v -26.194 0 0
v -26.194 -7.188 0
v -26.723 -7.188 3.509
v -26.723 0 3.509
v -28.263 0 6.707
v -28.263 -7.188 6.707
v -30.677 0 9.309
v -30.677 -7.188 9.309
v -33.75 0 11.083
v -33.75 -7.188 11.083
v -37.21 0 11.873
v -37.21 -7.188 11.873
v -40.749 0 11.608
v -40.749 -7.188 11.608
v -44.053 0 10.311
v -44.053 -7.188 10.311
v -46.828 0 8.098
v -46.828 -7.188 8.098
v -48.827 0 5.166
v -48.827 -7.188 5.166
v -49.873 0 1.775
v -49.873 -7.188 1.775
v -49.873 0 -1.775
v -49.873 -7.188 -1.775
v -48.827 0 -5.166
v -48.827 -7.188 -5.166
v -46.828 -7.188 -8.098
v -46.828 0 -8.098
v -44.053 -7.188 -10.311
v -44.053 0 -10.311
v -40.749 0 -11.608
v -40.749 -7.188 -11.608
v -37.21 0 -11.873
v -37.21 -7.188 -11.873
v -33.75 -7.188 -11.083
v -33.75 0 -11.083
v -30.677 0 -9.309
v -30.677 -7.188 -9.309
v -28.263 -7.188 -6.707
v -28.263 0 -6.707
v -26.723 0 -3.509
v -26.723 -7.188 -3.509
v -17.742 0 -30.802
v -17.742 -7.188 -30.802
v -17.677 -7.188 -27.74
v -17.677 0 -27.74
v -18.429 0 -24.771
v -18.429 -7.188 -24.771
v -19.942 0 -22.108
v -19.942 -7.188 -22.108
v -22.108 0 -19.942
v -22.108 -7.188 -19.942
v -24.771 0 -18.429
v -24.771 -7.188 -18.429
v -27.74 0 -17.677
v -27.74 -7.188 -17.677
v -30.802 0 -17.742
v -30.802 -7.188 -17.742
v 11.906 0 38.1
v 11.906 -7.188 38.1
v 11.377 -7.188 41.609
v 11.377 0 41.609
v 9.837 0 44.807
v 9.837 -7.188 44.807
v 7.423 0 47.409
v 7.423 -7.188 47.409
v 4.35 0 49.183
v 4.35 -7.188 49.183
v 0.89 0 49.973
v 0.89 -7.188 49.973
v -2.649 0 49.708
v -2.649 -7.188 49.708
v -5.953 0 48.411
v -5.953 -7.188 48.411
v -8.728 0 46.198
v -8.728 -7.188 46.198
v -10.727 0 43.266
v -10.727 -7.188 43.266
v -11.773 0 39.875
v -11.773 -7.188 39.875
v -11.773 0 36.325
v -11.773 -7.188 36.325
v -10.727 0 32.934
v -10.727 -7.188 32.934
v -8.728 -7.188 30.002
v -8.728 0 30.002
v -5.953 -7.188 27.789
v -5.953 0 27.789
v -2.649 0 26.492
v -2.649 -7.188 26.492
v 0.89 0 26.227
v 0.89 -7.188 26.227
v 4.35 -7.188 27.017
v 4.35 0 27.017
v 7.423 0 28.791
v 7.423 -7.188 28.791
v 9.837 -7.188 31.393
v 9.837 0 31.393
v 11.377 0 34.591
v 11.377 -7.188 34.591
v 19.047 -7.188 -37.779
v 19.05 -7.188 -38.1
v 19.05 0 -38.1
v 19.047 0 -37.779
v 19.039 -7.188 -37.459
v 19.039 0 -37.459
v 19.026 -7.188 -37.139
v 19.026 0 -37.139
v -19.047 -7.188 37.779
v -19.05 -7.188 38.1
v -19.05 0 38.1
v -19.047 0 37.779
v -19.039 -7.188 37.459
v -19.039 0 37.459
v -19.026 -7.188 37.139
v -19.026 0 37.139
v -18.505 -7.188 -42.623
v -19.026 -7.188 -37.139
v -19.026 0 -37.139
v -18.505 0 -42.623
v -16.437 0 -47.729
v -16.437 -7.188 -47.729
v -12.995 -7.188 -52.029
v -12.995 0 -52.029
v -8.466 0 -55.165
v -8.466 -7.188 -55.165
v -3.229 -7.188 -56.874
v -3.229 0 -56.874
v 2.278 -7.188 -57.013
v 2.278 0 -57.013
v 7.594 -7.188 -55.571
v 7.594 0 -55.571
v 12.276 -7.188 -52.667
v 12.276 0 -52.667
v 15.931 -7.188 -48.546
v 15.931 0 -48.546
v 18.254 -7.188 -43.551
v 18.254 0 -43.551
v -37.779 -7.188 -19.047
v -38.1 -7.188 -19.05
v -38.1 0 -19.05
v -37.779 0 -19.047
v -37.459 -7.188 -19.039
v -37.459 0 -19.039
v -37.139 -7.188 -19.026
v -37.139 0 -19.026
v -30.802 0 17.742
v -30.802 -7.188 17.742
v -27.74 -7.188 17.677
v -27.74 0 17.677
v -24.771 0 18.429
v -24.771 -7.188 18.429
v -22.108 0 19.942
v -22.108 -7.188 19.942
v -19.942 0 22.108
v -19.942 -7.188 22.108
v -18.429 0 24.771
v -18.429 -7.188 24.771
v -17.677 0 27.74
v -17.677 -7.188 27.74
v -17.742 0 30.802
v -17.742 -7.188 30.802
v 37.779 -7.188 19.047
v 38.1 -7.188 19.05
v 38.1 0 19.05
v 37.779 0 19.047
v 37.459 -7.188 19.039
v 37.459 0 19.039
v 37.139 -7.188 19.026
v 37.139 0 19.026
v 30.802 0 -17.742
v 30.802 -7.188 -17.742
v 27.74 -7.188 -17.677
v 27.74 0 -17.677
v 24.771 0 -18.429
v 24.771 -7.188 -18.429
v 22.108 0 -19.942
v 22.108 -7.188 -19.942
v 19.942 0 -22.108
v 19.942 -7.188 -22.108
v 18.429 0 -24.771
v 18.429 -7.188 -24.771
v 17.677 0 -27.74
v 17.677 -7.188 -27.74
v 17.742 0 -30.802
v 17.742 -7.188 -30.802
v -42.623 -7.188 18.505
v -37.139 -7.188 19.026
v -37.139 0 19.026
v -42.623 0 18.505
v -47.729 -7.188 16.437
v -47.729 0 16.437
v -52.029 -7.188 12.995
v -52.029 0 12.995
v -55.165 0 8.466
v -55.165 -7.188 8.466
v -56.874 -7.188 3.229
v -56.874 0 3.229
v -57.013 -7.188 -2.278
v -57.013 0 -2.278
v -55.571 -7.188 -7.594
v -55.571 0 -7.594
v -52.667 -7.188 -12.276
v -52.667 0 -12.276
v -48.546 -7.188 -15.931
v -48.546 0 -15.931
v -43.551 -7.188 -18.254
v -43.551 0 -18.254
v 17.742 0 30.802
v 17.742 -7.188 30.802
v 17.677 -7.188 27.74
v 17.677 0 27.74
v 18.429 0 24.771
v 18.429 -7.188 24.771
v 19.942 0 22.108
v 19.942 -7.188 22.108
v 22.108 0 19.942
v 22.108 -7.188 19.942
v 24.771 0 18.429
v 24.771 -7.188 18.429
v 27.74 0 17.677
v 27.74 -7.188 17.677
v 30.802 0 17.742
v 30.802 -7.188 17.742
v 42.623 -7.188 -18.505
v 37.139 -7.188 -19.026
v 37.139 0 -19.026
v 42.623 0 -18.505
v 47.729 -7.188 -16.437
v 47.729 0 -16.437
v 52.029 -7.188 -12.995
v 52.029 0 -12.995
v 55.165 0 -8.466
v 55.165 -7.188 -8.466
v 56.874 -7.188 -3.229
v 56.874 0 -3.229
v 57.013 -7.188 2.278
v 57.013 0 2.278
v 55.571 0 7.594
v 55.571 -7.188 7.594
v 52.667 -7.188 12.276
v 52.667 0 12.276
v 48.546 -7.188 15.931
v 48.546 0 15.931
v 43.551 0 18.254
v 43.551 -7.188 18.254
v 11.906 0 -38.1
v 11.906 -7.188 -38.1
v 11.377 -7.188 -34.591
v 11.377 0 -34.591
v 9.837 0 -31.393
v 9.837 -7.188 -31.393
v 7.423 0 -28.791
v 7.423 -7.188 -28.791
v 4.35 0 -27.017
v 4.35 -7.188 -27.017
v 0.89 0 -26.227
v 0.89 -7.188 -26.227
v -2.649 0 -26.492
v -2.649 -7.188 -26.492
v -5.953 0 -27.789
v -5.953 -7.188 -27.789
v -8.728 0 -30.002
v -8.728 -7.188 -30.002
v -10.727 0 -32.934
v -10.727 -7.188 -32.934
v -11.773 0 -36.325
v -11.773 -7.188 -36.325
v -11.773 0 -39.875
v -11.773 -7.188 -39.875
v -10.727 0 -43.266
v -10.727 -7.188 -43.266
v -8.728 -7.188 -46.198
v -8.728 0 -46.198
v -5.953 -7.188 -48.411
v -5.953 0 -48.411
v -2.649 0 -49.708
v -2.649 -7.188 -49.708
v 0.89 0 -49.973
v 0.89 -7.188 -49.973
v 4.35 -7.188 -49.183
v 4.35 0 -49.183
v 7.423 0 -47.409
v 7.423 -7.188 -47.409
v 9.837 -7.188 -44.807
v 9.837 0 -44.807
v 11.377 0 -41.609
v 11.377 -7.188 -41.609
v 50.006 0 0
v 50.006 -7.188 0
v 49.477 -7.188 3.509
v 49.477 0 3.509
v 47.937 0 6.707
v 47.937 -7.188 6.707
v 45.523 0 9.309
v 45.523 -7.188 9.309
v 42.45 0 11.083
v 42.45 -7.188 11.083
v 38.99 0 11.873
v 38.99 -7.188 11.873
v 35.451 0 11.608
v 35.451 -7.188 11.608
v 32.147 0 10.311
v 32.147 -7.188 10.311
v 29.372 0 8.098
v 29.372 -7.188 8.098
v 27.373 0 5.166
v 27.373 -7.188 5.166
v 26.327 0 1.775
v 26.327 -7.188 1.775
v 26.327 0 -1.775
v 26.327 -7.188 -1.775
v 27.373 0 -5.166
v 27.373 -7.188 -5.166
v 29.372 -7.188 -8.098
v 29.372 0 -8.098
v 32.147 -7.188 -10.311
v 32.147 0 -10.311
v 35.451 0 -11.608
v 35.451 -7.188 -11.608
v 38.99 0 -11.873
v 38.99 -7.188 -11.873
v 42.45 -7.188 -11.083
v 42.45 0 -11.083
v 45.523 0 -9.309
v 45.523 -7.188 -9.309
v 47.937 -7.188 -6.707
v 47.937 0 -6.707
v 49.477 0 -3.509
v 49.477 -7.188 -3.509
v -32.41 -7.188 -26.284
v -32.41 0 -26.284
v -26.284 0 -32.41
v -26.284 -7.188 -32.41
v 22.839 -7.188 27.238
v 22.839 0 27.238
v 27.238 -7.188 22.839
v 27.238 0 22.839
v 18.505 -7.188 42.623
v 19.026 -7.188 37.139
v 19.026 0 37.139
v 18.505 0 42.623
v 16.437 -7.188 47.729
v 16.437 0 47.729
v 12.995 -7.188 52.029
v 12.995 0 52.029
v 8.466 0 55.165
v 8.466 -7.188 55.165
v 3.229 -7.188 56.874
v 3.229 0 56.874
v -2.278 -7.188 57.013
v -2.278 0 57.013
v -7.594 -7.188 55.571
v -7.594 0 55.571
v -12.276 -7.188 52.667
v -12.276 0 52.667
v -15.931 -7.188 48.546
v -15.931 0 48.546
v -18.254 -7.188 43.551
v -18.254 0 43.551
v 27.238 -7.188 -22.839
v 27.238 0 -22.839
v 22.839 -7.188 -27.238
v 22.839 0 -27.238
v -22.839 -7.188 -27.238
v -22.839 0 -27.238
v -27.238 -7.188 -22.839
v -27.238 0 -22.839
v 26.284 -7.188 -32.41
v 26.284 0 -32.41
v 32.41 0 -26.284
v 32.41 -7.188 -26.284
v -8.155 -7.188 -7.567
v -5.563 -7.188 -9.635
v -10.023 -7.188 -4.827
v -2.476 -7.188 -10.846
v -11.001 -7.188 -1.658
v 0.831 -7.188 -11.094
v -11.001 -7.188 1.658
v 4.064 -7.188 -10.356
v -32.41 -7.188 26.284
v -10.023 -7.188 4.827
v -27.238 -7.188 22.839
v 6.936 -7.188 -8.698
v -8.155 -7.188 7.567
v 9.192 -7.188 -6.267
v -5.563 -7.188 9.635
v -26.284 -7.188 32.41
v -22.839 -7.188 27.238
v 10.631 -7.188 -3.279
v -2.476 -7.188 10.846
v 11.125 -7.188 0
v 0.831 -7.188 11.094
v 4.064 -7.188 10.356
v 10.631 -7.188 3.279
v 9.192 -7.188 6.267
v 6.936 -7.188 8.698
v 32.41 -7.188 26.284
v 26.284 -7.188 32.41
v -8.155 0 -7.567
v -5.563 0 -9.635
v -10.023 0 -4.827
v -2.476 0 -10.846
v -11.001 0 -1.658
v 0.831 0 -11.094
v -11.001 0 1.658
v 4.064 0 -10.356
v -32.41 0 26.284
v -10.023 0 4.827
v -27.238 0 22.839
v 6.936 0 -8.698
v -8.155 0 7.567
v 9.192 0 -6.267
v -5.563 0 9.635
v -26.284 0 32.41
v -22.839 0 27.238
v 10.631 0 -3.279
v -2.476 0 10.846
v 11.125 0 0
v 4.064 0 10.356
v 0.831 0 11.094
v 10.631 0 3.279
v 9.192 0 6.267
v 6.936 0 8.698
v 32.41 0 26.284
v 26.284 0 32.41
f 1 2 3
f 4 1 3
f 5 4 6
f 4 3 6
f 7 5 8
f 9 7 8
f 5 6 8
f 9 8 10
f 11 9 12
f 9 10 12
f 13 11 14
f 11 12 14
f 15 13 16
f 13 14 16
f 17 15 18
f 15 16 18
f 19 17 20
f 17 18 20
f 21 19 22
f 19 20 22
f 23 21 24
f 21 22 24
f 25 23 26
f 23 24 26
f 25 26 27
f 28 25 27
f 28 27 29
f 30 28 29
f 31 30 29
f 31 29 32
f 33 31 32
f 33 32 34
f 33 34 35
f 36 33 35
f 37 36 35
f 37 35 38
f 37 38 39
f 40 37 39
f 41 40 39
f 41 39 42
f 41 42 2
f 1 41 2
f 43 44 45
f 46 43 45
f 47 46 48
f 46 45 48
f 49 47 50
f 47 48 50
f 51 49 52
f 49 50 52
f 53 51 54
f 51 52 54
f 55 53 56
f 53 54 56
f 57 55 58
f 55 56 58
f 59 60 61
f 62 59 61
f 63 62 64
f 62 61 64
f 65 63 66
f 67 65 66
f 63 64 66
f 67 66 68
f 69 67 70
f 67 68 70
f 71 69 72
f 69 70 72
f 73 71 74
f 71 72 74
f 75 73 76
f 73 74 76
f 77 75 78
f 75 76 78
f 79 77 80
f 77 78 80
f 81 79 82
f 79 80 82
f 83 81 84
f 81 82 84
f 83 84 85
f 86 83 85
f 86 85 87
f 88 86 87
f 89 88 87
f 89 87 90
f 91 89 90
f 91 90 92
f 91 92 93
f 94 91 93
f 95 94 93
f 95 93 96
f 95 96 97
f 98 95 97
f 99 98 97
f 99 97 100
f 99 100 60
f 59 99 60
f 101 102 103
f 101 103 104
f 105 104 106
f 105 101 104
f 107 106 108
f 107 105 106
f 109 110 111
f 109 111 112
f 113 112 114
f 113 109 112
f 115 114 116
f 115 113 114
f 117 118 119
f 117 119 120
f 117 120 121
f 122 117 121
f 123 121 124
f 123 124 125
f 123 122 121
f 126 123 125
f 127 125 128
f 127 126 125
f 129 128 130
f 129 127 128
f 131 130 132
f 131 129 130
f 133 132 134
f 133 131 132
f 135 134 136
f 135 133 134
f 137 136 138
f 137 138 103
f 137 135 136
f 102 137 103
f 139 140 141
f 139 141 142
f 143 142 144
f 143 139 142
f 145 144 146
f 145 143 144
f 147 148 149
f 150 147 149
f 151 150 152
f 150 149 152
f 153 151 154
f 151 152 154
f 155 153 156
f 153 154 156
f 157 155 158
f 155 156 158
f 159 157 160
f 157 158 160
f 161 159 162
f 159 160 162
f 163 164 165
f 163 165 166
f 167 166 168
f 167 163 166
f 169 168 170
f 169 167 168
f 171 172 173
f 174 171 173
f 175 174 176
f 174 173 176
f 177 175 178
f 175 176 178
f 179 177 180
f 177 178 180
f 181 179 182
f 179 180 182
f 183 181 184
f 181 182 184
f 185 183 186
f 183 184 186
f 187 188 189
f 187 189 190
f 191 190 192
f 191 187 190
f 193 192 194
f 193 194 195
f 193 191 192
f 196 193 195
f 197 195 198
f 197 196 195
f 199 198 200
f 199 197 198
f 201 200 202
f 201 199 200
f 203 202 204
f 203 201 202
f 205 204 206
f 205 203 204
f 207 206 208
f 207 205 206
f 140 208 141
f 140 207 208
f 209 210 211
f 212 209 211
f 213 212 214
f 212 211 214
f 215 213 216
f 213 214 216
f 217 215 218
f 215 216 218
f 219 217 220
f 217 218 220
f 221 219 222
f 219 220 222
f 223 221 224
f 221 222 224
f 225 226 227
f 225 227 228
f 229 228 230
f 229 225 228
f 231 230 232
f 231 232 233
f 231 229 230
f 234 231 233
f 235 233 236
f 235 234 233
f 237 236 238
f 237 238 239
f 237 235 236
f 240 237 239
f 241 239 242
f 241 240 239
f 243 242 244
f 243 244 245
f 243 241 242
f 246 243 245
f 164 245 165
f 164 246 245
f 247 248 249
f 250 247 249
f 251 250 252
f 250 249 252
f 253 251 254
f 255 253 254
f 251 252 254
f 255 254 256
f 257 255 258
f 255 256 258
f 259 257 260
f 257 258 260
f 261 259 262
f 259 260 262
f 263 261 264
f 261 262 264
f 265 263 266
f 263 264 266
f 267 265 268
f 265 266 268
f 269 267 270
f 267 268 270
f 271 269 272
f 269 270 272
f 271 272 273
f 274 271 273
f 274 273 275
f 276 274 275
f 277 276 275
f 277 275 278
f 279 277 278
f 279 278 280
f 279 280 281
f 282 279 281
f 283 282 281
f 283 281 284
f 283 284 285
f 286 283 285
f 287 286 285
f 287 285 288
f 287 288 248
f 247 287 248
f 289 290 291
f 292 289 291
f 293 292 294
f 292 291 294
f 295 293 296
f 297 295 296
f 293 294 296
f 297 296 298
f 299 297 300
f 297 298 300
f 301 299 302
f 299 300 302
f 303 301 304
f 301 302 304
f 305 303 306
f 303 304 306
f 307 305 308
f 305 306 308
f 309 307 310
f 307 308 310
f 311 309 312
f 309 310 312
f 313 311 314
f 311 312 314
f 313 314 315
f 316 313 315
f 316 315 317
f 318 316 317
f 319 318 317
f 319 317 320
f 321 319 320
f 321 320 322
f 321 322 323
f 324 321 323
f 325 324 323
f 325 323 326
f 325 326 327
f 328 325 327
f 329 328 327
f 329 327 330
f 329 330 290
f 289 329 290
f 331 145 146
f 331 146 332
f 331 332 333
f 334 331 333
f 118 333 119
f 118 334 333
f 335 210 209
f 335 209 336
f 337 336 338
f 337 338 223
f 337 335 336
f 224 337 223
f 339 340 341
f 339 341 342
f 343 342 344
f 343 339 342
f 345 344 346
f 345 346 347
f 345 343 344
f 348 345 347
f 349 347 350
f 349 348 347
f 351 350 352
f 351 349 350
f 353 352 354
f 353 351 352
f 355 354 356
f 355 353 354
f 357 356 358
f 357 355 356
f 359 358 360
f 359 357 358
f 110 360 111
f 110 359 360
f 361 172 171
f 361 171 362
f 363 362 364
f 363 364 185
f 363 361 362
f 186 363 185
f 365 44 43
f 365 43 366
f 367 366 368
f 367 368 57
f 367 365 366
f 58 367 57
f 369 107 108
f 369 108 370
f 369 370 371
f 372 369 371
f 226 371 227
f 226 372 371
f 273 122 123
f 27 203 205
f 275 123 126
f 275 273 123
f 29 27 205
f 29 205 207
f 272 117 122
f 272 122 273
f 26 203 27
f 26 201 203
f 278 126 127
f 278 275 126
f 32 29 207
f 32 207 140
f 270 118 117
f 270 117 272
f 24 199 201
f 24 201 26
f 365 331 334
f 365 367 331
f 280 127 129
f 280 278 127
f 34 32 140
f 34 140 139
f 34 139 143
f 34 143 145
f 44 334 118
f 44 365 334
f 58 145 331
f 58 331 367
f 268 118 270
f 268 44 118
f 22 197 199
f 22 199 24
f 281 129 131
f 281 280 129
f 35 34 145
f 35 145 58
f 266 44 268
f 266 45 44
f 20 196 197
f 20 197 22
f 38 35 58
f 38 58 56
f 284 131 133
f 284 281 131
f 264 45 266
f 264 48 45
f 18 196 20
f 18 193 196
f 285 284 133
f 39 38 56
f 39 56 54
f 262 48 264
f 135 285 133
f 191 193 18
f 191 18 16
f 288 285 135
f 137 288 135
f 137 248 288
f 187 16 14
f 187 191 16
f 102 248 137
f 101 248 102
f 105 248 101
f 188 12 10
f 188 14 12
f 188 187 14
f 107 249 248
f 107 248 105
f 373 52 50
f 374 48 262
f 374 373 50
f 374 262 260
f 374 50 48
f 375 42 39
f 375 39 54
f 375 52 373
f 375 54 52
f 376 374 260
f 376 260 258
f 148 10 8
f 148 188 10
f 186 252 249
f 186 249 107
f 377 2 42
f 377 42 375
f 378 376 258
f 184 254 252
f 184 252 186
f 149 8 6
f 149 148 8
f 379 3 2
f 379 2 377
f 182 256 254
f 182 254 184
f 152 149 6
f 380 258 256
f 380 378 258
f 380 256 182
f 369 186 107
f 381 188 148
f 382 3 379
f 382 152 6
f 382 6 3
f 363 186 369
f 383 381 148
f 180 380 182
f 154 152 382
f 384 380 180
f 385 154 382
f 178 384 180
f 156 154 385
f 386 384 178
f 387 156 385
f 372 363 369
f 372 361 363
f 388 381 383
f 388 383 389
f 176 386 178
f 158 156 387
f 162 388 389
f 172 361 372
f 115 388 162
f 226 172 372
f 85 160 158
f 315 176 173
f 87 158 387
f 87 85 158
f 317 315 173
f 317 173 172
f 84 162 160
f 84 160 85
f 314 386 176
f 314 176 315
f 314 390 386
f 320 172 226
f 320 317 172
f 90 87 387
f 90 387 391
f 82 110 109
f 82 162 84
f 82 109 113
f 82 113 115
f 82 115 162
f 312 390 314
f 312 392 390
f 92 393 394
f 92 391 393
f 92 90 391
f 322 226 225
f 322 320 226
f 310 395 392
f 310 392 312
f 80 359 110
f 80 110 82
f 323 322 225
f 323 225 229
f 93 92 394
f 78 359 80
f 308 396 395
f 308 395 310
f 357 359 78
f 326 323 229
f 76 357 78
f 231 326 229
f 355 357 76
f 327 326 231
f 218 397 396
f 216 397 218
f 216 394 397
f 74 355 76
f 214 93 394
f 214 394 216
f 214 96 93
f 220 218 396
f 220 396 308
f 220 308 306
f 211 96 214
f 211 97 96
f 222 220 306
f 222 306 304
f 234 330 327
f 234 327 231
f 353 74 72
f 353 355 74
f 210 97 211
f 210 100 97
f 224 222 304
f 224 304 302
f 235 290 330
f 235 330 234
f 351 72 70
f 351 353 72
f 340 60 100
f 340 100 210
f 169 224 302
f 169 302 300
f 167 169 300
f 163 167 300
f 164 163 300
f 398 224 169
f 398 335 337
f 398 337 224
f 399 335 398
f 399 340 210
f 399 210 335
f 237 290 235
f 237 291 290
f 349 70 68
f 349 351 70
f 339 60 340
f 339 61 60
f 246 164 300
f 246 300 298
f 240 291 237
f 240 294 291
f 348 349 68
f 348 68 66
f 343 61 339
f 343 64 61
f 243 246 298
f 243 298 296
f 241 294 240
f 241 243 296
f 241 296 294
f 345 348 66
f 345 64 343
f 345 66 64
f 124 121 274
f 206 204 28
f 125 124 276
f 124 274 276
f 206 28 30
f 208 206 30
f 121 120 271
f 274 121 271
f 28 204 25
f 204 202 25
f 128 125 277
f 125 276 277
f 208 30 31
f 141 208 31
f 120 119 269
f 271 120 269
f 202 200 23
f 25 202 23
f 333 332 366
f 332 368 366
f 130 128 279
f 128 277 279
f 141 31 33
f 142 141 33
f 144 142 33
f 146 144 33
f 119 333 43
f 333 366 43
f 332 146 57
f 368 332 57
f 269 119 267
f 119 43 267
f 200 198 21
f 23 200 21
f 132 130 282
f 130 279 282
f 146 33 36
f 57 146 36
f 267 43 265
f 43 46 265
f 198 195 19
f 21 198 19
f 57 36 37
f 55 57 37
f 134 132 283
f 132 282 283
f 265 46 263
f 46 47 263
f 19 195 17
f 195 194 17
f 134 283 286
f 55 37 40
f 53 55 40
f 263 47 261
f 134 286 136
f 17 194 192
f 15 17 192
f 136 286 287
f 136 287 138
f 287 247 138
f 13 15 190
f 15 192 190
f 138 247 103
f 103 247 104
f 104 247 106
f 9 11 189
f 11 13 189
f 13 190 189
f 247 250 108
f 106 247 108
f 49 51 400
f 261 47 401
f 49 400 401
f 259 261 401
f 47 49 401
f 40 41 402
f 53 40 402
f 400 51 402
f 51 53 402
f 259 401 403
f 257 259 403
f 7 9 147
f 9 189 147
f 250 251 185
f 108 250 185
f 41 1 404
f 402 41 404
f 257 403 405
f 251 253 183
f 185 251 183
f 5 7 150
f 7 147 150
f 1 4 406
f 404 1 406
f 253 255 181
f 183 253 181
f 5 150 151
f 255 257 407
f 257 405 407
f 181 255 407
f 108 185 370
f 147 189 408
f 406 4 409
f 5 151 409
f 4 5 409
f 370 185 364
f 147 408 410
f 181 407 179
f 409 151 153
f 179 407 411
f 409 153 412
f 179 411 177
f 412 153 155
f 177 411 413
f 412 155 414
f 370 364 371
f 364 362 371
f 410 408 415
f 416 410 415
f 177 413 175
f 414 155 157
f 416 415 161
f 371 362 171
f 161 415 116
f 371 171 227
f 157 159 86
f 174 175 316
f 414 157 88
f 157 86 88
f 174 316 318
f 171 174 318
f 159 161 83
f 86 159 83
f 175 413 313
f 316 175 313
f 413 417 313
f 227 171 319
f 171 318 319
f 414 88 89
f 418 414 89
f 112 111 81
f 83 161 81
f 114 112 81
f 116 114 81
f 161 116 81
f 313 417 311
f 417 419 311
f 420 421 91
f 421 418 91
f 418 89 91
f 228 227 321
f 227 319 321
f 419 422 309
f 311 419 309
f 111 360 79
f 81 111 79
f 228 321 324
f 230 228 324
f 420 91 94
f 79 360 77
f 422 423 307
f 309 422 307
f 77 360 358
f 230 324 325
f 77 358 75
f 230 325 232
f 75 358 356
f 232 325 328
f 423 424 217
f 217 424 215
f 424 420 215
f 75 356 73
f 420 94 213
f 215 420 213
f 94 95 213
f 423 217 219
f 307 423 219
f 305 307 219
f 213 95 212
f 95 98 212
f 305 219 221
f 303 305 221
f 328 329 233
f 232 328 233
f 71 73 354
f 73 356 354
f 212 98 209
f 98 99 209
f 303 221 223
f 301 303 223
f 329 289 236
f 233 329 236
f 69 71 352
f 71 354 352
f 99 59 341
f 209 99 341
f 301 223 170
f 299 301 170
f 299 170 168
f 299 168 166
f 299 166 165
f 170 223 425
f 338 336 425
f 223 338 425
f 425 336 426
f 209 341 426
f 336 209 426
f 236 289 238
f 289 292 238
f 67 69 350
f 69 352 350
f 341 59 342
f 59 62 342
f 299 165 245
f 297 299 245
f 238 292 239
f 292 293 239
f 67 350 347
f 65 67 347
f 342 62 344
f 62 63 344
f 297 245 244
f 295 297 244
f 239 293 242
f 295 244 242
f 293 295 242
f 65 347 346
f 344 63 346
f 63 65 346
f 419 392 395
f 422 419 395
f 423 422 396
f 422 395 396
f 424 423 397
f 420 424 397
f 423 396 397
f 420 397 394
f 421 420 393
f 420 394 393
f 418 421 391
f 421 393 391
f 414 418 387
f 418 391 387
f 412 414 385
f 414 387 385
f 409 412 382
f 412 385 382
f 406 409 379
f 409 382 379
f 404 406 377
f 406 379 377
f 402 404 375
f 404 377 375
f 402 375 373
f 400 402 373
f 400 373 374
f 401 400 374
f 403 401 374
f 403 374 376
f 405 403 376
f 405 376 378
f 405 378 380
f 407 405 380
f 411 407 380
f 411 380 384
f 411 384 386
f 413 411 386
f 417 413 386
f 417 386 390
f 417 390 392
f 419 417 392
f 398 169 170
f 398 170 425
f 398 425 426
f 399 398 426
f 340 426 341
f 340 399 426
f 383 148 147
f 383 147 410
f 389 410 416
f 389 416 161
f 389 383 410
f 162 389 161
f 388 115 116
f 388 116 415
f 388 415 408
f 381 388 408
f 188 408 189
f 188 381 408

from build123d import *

# Parameters (mm, degrees)
F0_R            = 38.1
F1_DEPTH        = 7.1882
F2_R            = 11.1252
F3_DEPTH        = 7.62
F5_DEPTH        = 7.1882
F5_COPIES_COUNT = 4
F7_DEPTH        = 25.4
F9_DEPTH        = 7.1882
F10_R           = 11.90625
F11_DEPTH       = 25.4


# Not quite as in the source:
# - a pattern or mirror of a feature is missing from the dataset's text; its kind, count and spacing are read off the source's solid


with BuildPart() as f1:
    # F0 (on Front) → F1 (new body)
    with BuildSketch(Plane.XZ):
        Circle(F0_R)
    extrude(amount=F1_DEPTH)

    # F2 (on face) → F3 (cut)
    with BuildSketch(Plane.XZ.offset(7.1882)):
        Circle(F2_R)
    extrude(amount=-F3_DEPTH, mode=Mode.SUBTRACT)

    # F4 (on face) → F5 (join)
    with BuildSketch(Plane.XZ.offset(7.1882)):
        with BuildLine():
            ThreePointArc((-18.4450831863, 33.3375), (0, 19.05), (18.4450831863, 33.3375))
            ThreePointArc((18.4450831863, 33.3375), (0, 38.1), (-18.4450831863, 33.3375))
        make_face()
        with BuildLine():
            ThreePointArc((-19.05, 0), (-23.0396526434, 11.6656949), (-33.3375, 18.4450831863))
            ThreePointArc((-33.3375, 18.4450831863), (-38.1, 0), (-33.3375, -18.4450831863))
            ThreePointArc((-33.3375, -18.4450831863), (-23.0396526434, -11.6656949), (-19.05, 0))
        make_face()
        with BuildLine():
            ThreePointArc((19.05, -38.1), (18.8981657139, -35.6996182282), (18.4450831863, -33.3375))
            ThreePointArc((18.4450831863, -33.3375), (0, -38.1), (-18.4450831863, -33.3375))
            ThreePointArc((-18.4450831863, -33.3375), (-2.4003817718, -56.9981657139), (19.05, -38.1))
        make_face()
        with BuildLine():
            ThreePointArc((38.1, 0), (36.8901663726, 9.525), (33.3375, 18.4450831863))
            ThreePointArc((33.3375, 18.4450831863), (19.05, 0), (33.3375, -18.4450831863))
            ThreePointArc((33.3375, -18.4450831863), (36.8901663726, -9.525), (38.1, 0))
        make_face()
    f5 = extrude(amount=-F5_DEPTH)

    # F5_copies: F5 ×4 about axis
    f5_copies_axis = Axis((0, 0, 0), (0, 1, 0))
    for i in range(1, F5_COPIES_COUNT):
        add(f5.rotate(f5_copies_axis, i * 360 / F5_COPIES_COUNT))

    # F6 (on face) → F7 (cut)
    with BuildSketch(Plane.XZ.offset(7.1882)):
        with BuildLine():
            ThreePointArc((-33.3375, 18.4450831863), (-20.9517399354, 20.9517399354), (-18.4450831863, 33.3375))
            ThreePointArc((-18.4450831863, 33.3375), (-26.9407683632, 26.9407683632), (-33.3375, 18.4450831863))
        make_face()
        with BuildLine():
            ThreePointArc((-18.4450831863, -33.3375), (-20.9517399354, -20.9517399354), (-33.3375, -18.4450831863))
            ThreePointArc((-33.3375, -18.4450831863), (-26.9407683632, -26.9407683632), (-18.4450831863, -33.3375))
        make_face()
        with BuildLine():
            ThreePointArc((18.4450831863, -33.3375), (26.9407683632, -26.9407683632), (33.3375, -18.4450831863))
            ThreePointArc((33.3375, -18.4450831863), (20.9517399354, -20.9517399354), (18.4450831863, -33.3375))
        make_face()
        with BuildLine():
            ThreePointArc((33.3375, 18.4450831863), (26.9407683632, 26.9407683632), (18.4450831863, 33.3375))
            ThreePointArc((18.4450831863, 33.3375), (20.9517399354, 20.9517399354), (33.3375, 18.4450831863))
        make_face()
    extrude(amount=-F7_DEPTH, mode=Mode.SUBTRACT)

    # F8 (on face) → F9 (join)
    with BuildSketch(Plane.XZ.offset(7.1882)):
        with BuildLine():
            ThreePointArc((-37.1387970886, -19.0257349126), (-29.5065148582, -29.5065148582), (-19.0257349126, -37.1387970886))
            ThreePointArc((-19.0257349126, -37.1387970886), (-18.831569694, -35.2234599149), (-18.4450831863, -33.3375))
            ThreePointArc((-18.4450831863, -33.3375), (-18.0201411063, -32.0901876015), (-17.7415806811, -30.8022558951))
            ThreePointArc((-17.7415806811, -30.8022558951), (-25.1350616996, -25.1350616996), (-30.8022558951, -17.7415806811))
            ThreePointArc((-30.8022558951, -17.7415806811), (-32.0901876015, -18.0201411063), (-33.3375, -18.4450831863))
            ThreePointArc((-33.3375, -18.4450831863), (-35.2234599149, -18.831569694), (-37.1387970886, -19.0257349126))
        make_face()
        with BuildLine():
            ThreePointArc((19.0257349126, -37.1387970886), (29.5065148582, -29.5065148582), (37.1387970886, -19.0257349126))
            ThreePointArc((37.1387970886, -19.0257349126), (35.2234599149, -18.831569694), (33.3375, -18.4450831863))
            ThreePointArc((33.3375, -18.4450831863), (32.0901876015, -18.0201411063), (30.8022558951, -17.7415806811))
            ThreePointArc((30.8022558951, -17.7415806811), (25.1350616996, -25.1350616996), (17.7415806811, -30.8022558951))
            ThreePointArc((17.7415806811, -30.8022558951), (18.0201411063, -32.0901876015), (18.4450831863, -33.3375))
            ThreePointArc((18.4450831863, -33.3375), (18.831569694, -35.2234599149), (19.0257349126, -37.1387970886))
        make_face()
        with BuildLine():
            ThreePointArc((33.3375, 18.4450831863), (35.2234599149, 18.831569694), (37.1387970886, 19.0257349126))
            ThreePointArc((37.1387970886, 19.0257349126), (29.5065148582, 29.5065148582), (19.0257349126, 37.1387970886))
            ThreePointArc((19.0257349126, 37.1387970886), (18.831569694, 35.2234599149), (18.4450831863, 33.3375))
            ThreePointArc((18.4450831863, 33.3375), (18.0201411063, 32.0901876015), (17.7415806811, 30.8022558951))
            ThreePointArc((17.7415806811, 30.8022558951), (25.1350616996, 25.1350616996), (30.8022558951, 17.7415806811))
            ThreePointArc((30.8022558951, 17.7415806811), (32.0901876015, 18.0201411063), (33.3375, 18.4450831863))
        make_face()
        with BuildLine():
            ThreePointArc((-18.4450831863, 33.3375), (-18.831569694, 35.2234599149), (-19.0257349126, 37.1387970886))
            ThreePointArc((-19.0257349126, 37.1387970886), (-29.5065148582, 29.5065148582), (-37.1387970886, 19.0257349126))
            ThreePointArc((-37.1387970886, 19.0257349126), (-35.2234599149, 18.831569694), (-33.3375, 18.4450831863))
            ThreePointArc((-33.3375, 18.4450831863), (-32.0901876015, 18.0201411063), (-30.8022558951, 17.7415806811))
            ThreePointArc((-30.8022558951, 17.7415806811), (-25.1350616996, 25.1350616996), (-17.7415806811, 30.8022558951))
            ThreePointArc((-17.7415806811, 30.8022558951), (-18.0201411063, 32.0901876015), (-18.4450831863, 33.3375))
        make_face()
    extrude(amount=-F9_DEPTH)

    # F10 (on face) → F11 (cut)
    with BuildSketch(Plane.XZ.offset(7.1882)):
        with Locations((-38.1, 0)):
            Circle(F10_R)
        with Locations((0, 38.1)):
            Circle(F10_R)
        with Locations((38.1, 0)):
            Circle(F10_R)
        with Locations((0, -38.1)):
            Circle(F10_R)
    extrude(amount=-F11_DEPTH, mode=Mode.SUBTRACT)


solid = f1.part
